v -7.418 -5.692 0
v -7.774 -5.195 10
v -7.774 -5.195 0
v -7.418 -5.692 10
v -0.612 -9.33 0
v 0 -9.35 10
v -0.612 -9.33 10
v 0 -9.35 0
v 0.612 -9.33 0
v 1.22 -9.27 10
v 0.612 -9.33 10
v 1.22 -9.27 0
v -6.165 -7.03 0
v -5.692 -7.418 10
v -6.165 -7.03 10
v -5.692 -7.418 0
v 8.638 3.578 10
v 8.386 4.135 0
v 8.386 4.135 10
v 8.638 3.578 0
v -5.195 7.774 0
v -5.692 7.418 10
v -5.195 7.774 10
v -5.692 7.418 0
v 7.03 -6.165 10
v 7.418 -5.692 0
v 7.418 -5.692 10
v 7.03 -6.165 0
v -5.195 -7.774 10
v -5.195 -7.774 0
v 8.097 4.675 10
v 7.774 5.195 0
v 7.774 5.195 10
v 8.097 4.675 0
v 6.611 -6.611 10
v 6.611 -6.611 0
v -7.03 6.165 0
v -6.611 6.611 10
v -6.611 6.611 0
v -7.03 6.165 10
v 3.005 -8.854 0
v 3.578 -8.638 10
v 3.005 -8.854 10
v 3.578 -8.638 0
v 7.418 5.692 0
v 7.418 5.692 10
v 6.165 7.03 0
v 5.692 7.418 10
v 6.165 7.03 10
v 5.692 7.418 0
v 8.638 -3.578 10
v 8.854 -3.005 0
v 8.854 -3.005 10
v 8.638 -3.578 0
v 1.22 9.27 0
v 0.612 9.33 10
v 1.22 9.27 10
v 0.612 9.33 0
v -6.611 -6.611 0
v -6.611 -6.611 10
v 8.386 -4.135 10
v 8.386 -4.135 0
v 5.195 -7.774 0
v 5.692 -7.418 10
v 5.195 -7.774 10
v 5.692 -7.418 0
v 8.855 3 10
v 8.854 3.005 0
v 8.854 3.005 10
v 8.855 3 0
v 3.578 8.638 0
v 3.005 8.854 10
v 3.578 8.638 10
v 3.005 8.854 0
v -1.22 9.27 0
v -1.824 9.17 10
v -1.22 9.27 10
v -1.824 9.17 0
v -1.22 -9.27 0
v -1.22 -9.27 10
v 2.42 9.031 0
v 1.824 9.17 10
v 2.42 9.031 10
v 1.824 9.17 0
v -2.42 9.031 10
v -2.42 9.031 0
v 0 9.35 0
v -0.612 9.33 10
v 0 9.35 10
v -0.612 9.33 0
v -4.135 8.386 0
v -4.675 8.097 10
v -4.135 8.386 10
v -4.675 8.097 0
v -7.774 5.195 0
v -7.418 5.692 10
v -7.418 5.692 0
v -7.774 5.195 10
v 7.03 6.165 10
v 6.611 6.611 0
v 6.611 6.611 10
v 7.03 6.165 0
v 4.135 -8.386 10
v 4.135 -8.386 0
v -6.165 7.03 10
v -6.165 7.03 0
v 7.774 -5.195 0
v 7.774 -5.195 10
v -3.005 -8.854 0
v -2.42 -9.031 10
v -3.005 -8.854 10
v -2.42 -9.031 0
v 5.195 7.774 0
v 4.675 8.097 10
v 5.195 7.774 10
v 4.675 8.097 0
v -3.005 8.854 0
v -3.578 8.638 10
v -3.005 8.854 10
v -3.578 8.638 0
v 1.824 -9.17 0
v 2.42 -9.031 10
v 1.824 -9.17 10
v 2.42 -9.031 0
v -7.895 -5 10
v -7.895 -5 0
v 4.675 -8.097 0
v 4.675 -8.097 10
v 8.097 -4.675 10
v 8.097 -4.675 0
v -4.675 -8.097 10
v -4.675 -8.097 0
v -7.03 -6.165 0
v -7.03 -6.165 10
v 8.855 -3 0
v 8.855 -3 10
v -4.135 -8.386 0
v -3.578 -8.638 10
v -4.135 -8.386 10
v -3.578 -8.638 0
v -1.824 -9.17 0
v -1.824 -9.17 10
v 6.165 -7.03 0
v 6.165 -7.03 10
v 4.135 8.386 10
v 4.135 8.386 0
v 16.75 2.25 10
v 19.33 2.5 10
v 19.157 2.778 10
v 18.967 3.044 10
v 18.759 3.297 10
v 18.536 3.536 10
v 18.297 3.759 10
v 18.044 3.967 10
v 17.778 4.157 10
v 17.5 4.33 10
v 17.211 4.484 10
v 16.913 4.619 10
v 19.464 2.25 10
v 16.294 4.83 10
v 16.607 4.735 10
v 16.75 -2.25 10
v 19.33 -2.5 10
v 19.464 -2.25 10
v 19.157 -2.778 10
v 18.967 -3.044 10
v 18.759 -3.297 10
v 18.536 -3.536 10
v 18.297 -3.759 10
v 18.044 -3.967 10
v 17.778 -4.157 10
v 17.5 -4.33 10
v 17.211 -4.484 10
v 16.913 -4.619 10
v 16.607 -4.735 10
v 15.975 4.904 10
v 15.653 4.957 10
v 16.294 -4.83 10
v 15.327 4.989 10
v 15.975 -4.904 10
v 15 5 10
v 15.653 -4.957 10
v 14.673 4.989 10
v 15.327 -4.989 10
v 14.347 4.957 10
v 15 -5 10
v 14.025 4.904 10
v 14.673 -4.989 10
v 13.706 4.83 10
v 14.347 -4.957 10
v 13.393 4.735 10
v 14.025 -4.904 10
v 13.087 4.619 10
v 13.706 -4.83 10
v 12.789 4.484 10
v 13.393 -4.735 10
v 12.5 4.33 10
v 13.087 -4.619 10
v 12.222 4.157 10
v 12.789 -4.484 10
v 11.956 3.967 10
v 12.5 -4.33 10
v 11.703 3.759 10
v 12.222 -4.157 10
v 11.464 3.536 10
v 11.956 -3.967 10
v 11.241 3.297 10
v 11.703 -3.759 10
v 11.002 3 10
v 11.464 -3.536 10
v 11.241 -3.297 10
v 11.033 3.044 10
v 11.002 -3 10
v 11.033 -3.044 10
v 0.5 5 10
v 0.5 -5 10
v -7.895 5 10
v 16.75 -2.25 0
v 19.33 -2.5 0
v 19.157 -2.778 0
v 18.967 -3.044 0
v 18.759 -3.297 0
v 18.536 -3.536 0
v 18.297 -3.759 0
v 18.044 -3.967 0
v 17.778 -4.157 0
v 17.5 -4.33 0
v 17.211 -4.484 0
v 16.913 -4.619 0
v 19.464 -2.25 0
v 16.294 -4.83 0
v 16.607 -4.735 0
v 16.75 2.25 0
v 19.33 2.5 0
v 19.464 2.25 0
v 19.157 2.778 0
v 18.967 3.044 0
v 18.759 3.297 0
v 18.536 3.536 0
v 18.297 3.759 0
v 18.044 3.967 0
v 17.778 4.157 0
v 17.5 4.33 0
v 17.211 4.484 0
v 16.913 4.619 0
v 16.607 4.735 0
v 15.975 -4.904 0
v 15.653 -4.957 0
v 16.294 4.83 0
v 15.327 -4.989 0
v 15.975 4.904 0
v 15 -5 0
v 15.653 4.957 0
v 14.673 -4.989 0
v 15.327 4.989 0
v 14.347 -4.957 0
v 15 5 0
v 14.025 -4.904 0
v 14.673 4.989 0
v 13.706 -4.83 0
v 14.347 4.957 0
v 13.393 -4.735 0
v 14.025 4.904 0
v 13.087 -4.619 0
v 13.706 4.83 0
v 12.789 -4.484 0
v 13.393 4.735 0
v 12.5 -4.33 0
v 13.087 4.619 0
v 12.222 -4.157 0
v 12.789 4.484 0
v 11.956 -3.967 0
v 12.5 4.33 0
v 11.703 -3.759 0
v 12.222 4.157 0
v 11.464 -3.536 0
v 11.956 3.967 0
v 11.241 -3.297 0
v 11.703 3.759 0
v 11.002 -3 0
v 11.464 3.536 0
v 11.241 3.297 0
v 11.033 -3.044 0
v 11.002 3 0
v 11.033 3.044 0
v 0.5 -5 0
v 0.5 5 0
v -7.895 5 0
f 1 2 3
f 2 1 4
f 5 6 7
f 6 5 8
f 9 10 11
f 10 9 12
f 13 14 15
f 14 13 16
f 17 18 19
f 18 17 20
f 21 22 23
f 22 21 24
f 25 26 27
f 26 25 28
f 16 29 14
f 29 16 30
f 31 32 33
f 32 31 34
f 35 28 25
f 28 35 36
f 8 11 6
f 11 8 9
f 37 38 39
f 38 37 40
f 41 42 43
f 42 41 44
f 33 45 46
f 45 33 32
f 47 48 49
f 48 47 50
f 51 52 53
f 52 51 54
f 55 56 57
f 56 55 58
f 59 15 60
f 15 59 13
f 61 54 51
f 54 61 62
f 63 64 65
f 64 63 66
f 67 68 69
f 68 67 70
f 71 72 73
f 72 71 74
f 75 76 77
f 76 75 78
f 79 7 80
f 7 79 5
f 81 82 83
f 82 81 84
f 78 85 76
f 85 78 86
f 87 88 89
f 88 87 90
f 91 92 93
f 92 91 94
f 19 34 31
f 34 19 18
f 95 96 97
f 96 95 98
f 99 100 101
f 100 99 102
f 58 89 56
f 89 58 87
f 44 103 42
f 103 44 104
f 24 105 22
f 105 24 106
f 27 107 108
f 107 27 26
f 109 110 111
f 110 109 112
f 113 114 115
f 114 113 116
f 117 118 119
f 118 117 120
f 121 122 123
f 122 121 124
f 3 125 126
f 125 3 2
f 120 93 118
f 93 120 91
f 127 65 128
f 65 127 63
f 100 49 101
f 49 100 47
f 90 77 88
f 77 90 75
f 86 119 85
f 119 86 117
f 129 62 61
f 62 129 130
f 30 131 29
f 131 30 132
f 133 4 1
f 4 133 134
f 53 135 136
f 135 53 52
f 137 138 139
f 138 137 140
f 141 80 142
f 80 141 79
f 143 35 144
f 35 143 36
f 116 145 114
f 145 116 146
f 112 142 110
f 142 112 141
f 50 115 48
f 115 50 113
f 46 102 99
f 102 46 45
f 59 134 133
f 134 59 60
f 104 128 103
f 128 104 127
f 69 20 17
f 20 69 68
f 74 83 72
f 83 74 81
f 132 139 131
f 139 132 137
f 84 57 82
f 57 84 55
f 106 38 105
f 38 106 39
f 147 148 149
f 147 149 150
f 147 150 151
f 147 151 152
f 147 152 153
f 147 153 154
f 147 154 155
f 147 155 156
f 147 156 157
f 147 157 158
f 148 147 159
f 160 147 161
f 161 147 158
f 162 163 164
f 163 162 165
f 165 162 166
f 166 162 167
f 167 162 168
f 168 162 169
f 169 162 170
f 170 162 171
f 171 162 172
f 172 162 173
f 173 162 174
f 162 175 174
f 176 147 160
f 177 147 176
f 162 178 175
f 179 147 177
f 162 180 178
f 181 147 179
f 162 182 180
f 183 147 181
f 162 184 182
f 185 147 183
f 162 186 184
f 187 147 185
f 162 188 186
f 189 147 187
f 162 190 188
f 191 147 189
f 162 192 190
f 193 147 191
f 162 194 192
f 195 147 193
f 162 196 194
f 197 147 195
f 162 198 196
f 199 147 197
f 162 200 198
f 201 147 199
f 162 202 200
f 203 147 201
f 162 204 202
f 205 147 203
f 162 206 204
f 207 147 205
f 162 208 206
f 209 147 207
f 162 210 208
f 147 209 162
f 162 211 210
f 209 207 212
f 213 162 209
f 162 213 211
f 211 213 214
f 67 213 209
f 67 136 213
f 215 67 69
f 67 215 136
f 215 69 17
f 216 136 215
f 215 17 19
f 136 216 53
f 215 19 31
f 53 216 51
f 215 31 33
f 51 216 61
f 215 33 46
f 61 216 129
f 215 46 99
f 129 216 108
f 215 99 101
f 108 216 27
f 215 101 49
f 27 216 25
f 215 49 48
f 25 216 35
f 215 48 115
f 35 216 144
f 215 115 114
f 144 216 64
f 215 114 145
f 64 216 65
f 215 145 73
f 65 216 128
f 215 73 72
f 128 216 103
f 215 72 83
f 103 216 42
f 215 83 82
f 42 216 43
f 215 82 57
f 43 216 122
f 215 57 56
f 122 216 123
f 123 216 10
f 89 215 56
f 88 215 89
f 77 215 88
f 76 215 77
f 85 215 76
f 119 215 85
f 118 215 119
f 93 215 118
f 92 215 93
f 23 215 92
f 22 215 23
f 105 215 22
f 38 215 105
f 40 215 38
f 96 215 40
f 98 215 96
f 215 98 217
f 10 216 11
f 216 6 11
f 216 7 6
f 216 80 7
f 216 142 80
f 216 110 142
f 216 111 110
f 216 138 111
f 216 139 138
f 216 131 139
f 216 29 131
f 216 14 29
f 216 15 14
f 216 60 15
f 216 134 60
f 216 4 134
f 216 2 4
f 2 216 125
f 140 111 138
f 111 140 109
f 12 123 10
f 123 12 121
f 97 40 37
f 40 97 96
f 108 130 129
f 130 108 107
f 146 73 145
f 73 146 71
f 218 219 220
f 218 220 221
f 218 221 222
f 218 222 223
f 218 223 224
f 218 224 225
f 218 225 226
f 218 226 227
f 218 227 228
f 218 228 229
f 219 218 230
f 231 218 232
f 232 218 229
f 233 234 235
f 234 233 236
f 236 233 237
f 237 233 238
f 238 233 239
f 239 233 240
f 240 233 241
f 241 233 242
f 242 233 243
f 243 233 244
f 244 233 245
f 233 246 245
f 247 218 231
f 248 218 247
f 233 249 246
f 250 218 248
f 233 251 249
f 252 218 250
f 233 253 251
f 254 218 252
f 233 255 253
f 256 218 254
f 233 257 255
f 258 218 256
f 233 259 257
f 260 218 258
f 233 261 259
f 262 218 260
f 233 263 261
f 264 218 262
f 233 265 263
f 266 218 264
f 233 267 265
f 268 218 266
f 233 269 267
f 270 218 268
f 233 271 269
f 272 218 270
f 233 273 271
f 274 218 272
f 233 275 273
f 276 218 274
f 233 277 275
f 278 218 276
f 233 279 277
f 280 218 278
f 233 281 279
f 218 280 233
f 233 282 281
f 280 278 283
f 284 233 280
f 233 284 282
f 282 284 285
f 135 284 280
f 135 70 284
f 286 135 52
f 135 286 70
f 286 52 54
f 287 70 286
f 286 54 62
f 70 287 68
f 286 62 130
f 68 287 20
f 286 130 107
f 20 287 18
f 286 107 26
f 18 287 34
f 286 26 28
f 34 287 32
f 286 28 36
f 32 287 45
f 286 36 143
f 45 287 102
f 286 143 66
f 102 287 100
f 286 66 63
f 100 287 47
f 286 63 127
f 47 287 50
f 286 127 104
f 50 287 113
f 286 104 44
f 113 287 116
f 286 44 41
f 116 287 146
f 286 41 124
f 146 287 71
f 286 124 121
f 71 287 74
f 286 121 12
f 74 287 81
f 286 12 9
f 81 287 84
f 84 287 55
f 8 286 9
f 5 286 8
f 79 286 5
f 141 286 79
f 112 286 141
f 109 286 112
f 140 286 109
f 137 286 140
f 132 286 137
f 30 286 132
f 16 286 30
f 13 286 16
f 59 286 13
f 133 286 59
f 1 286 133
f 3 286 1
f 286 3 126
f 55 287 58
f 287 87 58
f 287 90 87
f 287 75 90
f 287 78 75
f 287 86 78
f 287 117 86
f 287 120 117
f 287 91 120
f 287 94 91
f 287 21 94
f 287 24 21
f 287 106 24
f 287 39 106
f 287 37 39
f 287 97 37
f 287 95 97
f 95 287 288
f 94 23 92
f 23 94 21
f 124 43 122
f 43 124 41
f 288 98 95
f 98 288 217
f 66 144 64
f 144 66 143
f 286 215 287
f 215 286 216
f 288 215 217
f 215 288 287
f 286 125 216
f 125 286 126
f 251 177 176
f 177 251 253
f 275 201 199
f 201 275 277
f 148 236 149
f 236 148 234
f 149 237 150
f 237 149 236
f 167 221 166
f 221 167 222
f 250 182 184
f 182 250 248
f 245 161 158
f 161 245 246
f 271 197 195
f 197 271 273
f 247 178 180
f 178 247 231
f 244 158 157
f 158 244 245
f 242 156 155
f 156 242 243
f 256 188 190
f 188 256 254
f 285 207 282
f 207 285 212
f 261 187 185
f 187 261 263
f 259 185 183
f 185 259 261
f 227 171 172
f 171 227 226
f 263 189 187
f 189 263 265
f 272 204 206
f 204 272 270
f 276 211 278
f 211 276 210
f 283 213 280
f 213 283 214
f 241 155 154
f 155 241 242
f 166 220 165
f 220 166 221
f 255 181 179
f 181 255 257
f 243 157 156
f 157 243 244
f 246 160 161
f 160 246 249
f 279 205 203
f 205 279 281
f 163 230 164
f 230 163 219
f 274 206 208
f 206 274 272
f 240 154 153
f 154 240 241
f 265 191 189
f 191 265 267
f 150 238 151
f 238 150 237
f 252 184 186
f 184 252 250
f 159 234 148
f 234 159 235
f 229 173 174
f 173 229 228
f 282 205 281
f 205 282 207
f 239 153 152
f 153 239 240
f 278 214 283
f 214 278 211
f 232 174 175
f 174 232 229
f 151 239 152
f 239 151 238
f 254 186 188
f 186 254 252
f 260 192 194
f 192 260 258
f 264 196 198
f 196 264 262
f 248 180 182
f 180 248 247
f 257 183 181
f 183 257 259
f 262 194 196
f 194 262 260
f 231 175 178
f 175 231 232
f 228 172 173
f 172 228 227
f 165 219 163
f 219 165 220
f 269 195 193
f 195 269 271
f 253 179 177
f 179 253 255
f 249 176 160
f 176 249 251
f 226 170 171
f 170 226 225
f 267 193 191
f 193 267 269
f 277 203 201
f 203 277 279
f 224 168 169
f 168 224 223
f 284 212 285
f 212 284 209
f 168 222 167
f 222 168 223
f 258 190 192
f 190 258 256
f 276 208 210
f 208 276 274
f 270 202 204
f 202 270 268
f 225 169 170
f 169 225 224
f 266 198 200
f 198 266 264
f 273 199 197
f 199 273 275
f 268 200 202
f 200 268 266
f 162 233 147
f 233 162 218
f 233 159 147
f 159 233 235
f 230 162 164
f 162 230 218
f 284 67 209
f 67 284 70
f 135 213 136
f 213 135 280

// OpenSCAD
// Tubing/stand rod snap-on clip
// Print orientation: flat on bed, z = 0 up to z = height

// ---------------- Parameters ----------------
height      = 10;     // extrusion height (Z)
rod_d       = 12.7;   // stand rod diameter
rod_wall    = 3;      // rod ring wall thickness
rod_open_w  = 10;     // opening width on -X side of rod ring
tub_d       = 6;      // tubing inner diameter
tub_wall    = 2;      // tubing ring wall thickness
tub_x       = 15;     // tubing ring centre X
tub_open_w  = 4.5;    // opening width on +X side of tubing ring
bridge_x0   = 8;      // bridge start X
bridge_x1   = 12;     // bridge end X
bridge_y    = 6;      // bridge width (Y)
eps         = 0.5;    // cutter overshoot past faces

$fn = 96;

// ---------------- Derived ----------------
rod_d_out   = rod_d + 2 * rod_wall;
tub_d_out   = tub_d + 2 * tub_wall;
tub_r_open  = tub_open_w / 2;

// ---------------- Modules ----------------
module rod_ring() {
    difference() {
        cylinder(d = rod_d_out, h = height);
        // opening: x < 0 and -5 < y < 5
        translate([-height - eps, -5, -eps])
            cube([height + 2 * eps, 10, height + 2 * eps]);
    }
}

module tub_ring() {
    difference() {
        translate([tub_x, 0, 0])
            cylinder(d = tub_d_out, h = height);
        // opening: x > 15 and -2.25 < y < 2.25
        translate([tub_x + tub_open_w / 2 - eps, -tub_r_open, -eps])
            cube([height + 2 * eps, tub_open_w, height + 2 * eps]);
    }
}

module bridge() {
    translate([bridge_x0, -bridge_y / 2, 0])
        cube([bridge_x1 - bridge_x0, bridge_y, height]);
}

// ---------------- Assembly ----------------
union() {
    rod_ring();
    tub_ring();
    bridge();
}
